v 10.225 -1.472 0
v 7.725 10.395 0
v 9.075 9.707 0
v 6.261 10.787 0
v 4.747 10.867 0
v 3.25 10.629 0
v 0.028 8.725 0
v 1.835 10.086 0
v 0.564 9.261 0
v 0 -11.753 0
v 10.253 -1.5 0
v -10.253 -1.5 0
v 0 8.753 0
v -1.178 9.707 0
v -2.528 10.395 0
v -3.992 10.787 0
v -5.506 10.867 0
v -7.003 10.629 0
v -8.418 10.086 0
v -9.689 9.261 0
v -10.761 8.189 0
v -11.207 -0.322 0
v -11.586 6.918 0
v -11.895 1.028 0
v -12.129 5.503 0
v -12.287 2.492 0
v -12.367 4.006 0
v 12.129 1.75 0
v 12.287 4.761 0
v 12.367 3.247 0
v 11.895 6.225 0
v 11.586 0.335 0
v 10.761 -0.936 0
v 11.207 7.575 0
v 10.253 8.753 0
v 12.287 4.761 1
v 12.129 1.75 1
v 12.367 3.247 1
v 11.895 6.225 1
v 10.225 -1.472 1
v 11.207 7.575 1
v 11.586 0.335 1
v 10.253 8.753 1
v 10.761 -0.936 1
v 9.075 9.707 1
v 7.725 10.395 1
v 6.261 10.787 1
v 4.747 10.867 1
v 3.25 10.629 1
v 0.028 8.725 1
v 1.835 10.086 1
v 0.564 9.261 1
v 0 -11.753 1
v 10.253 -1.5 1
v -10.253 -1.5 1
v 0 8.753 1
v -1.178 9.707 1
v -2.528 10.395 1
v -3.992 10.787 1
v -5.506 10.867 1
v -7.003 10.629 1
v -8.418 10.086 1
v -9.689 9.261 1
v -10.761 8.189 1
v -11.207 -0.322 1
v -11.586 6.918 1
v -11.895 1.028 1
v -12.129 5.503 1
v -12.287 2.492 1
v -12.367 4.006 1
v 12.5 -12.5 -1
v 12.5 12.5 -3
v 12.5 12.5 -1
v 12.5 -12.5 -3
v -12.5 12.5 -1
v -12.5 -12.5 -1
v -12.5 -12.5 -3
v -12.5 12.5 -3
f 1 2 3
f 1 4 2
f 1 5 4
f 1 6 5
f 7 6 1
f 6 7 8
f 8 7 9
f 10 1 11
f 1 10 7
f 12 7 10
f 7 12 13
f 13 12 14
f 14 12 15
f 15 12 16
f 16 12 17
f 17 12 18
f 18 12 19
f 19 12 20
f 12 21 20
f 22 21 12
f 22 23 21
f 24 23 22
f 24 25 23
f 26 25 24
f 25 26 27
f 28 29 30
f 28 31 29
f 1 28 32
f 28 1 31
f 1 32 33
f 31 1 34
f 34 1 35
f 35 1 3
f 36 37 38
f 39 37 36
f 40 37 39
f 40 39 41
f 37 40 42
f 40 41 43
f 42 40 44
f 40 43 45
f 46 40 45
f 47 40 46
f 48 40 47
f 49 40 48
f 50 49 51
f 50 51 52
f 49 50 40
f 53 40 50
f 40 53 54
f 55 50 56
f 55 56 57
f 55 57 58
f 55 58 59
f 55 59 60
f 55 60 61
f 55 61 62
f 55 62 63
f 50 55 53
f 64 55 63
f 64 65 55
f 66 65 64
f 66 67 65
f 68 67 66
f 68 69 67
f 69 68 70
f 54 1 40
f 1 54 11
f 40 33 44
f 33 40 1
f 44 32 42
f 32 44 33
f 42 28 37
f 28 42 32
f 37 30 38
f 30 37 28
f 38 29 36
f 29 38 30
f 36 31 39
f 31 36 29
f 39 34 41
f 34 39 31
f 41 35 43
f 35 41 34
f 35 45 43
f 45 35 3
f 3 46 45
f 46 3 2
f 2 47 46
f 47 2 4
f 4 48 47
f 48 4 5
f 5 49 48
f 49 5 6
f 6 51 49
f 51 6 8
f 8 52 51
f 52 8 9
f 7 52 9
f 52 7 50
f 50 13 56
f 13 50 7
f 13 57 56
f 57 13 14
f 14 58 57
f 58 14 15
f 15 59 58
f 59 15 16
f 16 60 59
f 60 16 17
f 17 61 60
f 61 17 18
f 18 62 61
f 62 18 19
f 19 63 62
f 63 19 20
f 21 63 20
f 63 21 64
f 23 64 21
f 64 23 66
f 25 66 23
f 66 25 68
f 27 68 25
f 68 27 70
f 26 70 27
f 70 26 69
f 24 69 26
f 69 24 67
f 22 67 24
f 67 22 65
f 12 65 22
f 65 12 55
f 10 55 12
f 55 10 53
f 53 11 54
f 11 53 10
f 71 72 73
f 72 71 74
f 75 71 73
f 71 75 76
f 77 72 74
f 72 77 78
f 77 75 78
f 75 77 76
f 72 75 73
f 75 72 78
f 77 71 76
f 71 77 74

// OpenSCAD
// file: ../../external-resources/thumbnail-background.scad
module thumbnailBackground()
{
	color("green")
	translate([0, 0, -2])
	cube([25, 25, 2], center=true);	
}
// file: heart.scad
module heart(h=1)
{
    rotate ([0, 0, 45])
    linear_extrude(height=h)
    flatHeart();
}

module heartThumbnail()
{	
	xyScale = 0.725;
	translate([0, -1.5, 0])
	scale([xyScale, xyScale, 1])
	heart();
}

module flatHeart()
{
	square(20, center = true);
	
	translate([10,0,0])	
	circle(10, center = true, color="red" );
	
	translate([0,10,0]) 
	circle(10, center = true);
}
// main file
use <heart.scad>
use <../../external-resources/thumbnail-background.scad>

heartThumbnail();

thumbnailBackground();
